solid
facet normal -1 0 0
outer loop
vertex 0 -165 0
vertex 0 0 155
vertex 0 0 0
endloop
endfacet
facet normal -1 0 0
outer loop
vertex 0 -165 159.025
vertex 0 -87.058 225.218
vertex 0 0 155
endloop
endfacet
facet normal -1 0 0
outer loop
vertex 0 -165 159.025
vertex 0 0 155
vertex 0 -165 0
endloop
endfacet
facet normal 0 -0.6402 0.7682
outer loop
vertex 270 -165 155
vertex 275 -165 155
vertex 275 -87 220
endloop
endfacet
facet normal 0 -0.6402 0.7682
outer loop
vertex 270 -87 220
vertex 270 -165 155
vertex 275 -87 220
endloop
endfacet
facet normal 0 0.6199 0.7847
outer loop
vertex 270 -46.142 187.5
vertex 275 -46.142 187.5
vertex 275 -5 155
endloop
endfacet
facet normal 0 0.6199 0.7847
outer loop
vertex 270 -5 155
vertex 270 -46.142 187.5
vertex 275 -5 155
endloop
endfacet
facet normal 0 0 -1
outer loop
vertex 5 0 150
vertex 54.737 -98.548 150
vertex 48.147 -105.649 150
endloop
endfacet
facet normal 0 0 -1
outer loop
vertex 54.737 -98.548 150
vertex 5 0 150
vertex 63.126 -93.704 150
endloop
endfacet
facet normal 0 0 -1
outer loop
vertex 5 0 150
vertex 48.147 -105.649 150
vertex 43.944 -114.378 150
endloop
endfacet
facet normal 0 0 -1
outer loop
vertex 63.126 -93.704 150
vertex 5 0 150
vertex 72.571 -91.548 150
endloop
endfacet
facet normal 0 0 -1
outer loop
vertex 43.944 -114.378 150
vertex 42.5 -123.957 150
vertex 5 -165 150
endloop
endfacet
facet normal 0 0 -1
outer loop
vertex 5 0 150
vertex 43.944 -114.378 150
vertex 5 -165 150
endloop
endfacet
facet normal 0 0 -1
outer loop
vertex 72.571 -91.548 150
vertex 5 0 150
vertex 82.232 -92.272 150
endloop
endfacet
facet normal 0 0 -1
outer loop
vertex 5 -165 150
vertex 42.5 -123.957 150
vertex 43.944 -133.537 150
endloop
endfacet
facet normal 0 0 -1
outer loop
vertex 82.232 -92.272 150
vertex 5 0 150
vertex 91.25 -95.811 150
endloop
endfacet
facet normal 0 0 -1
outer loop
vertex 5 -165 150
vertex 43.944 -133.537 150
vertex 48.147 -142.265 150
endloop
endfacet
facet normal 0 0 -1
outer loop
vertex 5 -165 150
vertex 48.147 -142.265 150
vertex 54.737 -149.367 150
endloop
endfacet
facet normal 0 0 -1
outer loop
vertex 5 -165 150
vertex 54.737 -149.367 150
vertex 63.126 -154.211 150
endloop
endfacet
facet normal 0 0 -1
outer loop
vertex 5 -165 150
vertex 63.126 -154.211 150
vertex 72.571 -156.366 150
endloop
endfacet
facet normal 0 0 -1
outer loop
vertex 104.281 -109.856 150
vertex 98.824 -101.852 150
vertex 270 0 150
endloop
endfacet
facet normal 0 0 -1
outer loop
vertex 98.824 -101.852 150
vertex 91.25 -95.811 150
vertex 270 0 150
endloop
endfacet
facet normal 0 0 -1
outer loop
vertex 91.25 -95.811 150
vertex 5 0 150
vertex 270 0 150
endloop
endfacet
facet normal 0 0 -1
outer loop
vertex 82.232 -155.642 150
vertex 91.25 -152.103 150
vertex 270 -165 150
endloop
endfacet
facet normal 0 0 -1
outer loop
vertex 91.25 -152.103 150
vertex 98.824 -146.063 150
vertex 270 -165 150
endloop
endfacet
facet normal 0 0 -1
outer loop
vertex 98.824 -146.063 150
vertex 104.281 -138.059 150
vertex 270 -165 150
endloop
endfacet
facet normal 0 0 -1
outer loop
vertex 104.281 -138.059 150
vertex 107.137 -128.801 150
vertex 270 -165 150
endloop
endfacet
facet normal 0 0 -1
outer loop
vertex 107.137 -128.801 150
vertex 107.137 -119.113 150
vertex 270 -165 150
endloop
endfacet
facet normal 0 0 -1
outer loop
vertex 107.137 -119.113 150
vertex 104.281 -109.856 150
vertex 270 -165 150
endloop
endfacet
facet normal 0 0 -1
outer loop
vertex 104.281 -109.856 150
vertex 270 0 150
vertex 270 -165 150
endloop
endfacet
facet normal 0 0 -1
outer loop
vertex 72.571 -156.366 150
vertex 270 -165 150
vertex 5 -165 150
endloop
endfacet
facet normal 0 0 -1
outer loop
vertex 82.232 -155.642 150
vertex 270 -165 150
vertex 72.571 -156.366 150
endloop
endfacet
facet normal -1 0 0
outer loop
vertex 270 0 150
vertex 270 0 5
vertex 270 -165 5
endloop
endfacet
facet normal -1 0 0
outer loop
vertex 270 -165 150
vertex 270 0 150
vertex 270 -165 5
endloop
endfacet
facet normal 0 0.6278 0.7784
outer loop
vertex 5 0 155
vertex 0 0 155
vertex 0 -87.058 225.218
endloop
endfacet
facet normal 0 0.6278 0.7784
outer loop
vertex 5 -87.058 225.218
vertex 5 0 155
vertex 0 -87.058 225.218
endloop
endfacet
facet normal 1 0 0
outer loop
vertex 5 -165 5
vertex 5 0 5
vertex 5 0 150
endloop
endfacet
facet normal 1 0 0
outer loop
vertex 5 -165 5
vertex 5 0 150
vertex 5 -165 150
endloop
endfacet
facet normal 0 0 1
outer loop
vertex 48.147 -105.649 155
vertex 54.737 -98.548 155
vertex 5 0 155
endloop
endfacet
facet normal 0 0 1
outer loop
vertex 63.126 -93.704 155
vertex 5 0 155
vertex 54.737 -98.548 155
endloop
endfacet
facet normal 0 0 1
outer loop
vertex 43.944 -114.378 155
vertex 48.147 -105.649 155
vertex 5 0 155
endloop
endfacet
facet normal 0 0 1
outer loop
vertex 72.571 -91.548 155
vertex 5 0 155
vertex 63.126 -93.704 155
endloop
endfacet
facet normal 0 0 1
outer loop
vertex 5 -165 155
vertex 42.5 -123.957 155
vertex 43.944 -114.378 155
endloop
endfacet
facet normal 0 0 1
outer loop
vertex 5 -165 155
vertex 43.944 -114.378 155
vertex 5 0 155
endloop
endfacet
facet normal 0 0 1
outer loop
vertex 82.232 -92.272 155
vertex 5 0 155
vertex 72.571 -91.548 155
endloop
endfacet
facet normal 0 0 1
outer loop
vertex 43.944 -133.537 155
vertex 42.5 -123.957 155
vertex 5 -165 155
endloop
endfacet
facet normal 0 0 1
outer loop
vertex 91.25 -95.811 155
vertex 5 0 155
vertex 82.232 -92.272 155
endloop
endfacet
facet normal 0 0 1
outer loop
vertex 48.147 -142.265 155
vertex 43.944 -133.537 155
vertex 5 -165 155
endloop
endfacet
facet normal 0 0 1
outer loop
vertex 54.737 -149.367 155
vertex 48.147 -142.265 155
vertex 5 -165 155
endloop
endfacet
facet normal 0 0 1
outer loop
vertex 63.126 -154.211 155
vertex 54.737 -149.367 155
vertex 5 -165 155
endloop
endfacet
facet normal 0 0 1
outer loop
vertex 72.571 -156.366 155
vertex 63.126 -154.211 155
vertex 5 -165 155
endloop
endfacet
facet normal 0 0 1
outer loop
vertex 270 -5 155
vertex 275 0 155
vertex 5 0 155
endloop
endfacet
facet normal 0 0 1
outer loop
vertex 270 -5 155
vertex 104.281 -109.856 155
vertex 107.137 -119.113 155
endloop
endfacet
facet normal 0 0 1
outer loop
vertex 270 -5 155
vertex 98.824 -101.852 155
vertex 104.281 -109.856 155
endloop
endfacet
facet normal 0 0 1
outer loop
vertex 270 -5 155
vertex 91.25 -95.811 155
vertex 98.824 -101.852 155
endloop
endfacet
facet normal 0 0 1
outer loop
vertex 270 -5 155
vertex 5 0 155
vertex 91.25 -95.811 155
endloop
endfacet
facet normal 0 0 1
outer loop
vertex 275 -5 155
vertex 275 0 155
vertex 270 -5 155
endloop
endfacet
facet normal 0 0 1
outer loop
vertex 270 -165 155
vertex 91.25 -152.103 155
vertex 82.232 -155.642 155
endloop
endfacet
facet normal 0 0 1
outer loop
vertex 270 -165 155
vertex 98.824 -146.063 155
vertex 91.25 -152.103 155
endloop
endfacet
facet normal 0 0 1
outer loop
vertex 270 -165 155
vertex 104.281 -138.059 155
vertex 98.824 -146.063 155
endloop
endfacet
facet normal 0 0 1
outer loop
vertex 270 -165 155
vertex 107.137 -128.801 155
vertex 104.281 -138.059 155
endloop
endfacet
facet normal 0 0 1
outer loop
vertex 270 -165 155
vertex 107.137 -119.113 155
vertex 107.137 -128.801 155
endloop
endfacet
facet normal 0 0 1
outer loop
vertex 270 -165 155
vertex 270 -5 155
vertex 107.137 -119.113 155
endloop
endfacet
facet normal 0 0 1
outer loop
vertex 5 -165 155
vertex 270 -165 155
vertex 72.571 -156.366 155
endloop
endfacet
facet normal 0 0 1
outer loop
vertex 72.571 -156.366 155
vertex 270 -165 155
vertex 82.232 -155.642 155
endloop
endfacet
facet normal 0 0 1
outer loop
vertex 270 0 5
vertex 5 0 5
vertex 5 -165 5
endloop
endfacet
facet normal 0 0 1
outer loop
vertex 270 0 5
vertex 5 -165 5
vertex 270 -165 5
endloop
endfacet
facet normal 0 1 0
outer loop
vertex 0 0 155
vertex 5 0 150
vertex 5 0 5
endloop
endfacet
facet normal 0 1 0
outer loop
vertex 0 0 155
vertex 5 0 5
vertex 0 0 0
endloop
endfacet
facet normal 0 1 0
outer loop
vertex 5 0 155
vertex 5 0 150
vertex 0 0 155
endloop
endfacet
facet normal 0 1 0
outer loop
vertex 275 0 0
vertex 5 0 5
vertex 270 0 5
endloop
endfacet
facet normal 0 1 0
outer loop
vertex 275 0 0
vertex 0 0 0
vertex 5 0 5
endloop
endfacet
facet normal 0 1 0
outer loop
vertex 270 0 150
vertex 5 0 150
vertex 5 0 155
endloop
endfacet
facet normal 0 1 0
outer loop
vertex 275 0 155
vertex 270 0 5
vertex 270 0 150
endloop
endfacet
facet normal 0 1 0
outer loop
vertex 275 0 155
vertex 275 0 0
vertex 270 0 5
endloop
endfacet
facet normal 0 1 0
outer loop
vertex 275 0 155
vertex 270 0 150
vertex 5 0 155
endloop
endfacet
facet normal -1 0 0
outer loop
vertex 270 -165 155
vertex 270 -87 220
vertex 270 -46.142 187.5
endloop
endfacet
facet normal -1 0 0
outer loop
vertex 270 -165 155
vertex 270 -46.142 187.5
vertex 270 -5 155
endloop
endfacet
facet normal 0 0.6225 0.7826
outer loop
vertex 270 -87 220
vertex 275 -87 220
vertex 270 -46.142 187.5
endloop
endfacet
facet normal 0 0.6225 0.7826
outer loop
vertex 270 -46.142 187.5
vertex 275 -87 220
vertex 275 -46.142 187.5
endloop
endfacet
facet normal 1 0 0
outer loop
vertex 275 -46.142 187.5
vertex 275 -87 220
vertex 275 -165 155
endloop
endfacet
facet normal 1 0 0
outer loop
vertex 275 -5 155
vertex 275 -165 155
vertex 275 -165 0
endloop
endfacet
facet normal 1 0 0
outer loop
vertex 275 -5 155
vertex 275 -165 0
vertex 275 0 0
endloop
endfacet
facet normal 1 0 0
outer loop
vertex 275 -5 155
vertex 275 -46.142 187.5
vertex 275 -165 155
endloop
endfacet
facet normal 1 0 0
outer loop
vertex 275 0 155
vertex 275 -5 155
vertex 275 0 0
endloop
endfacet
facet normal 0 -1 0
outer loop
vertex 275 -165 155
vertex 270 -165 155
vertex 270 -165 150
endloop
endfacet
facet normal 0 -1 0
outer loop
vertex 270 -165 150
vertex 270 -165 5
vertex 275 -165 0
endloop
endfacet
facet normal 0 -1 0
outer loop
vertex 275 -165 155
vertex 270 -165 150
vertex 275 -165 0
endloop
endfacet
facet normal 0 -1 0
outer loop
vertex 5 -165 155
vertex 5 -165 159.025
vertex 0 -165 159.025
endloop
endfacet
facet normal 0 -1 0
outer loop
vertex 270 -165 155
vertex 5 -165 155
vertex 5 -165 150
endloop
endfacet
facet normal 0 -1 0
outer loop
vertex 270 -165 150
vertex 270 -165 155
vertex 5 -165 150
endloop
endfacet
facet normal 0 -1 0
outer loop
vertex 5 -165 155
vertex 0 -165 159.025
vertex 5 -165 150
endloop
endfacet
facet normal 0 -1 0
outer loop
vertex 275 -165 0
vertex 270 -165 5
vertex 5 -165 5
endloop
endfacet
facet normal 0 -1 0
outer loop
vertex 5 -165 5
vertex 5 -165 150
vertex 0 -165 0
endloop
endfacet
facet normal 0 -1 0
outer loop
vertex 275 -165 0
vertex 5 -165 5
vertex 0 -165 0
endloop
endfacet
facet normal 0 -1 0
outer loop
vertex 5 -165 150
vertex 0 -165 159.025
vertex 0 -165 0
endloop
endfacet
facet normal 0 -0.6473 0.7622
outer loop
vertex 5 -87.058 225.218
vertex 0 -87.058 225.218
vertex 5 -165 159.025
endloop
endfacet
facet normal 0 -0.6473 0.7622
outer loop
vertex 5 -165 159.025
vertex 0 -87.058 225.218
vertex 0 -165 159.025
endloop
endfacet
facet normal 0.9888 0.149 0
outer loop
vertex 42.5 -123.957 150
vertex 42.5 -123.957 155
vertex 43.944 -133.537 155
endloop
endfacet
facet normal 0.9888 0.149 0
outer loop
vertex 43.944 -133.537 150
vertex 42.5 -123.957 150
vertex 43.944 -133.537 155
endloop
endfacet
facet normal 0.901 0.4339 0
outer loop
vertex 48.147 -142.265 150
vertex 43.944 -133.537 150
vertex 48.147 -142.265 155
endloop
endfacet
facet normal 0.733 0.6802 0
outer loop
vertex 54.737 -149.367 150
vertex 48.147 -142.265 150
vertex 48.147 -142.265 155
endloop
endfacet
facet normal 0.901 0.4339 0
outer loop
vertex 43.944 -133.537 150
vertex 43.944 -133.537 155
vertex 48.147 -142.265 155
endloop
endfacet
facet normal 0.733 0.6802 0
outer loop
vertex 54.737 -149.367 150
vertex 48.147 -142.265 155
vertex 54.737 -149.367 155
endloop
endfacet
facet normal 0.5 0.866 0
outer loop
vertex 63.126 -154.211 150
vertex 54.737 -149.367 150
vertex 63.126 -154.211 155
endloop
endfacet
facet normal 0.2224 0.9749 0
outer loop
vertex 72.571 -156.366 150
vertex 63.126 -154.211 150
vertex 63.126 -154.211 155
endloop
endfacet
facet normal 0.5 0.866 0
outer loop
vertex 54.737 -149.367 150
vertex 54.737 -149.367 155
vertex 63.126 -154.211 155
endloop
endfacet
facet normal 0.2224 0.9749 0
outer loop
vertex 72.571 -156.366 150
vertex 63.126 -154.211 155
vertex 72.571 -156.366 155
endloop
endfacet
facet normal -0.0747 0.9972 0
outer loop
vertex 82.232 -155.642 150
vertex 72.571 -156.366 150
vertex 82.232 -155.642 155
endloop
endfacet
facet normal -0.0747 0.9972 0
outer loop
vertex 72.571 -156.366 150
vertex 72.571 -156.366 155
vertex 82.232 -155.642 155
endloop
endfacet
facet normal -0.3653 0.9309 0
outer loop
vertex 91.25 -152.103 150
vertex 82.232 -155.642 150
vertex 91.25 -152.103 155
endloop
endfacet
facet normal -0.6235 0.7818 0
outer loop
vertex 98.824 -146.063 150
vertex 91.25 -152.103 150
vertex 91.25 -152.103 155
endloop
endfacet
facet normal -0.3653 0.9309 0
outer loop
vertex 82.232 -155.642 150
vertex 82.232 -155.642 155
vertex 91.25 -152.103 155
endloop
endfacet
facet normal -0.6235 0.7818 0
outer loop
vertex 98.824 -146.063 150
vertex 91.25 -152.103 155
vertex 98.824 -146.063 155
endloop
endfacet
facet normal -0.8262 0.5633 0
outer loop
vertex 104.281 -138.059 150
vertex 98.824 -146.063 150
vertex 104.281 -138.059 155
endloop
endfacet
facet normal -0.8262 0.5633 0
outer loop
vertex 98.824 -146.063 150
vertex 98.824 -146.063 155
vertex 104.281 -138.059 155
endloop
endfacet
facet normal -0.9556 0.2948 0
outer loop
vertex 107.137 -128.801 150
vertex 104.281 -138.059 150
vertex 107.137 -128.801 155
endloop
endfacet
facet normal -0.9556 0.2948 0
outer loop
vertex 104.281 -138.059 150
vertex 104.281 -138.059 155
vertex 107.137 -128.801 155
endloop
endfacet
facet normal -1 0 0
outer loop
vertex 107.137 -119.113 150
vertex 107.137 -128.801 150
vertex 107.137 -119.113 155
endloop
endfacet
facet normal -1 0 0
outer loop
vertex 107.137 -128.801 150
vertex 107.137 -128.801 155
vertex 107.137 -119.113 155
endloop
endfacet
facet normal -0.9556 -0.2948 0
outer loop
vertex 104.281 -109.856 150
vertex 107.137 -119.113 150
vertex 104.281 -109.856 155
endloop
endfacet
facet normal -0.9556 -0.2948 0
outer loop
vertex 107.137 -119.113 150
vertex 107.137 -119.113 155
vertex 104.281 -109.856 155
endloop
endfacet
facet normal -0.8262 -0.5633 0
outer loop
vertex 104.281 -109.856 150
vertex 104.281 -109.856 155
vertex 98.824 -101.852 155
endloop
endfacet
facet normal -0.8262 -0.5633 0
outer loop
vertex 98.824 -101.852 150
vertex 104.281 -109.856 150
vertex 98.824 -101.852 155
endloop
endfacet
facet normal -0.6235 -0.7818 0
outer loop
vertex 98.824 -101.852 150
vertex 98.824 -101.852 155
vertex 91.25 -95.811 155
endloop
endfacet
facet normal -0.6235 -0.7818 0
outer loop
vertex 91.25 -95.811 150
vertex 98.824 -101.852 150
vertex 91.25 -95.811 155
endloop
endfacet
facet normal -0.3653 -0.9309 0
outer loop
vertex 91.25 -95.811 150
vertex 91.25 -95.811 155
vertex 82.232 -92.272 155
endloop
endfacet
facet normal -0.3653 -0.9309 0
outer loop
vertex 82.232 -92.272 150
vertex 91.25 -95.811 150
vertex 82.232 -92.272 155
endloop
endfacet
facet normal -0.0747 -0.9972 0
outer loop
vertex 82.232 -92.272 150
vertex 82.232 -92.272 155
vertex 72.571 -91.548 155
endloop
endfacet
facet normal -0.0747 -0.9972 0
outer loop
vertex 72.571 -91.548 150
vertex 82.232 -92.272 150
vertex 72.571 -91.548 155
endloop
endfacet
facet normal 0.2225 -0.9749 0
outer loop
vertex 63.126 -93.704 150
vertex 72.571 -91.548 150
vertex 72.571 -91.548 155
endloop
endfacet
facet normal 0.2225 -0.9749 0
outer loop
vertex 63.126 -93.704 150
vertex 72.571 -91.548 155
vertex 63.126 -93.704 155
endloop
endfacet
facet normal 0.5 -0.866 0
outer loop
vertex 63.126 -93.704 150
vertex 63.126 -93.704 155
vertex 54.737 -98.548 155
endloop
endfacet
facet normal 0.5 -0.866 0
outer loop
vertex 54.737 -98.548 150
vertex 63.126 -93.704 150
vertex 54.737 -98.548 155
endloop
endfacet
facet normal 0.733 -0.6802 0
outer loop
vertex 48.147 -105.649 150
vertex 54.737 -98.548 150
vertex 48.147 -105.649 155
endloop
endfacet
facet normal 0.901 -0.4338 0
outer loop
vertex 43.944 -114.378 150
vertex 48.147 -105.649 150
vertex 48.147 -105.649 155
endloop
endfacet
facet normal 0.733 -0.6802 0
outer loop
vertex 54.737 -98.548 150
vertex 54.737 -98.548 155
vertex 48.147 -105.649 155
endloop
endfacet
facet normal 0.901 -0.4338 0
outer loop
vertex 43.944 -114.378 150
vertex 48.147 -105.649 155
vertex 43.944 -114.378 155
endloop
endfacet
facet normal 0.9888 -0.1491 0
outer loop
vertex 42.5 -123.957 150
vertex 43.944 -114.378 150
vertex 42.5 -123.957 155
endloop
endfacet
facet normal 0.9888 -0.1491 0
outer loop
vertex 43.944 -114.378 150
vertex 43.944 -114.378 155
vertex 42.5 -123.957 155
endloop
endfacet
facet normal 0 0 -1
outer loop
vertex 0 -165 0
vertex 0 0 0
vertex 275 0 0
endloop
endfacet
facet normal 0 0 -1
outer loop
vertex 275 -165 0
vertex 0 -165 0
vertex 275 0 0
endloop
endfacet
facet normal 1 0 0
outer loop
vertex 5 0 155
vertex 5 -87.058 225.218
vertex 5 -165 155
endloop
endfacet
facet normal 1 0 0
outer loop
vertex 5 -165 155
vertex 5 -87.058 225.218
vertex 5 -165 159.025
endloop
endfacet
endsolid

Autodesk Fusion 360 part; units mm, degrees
sketch "Sketch1" plane through (0, 0, 0) normal (0, 0, 1) x (1, 0, 0)
  line L0 (0, 0) -> (275, 0)
  line L1 (275, 0) -> (275, -165)
  line L2 (275, -165) -> (0, -165)
  line L3 (0, -165) -> (0, 0)
  dimension "d1" = 275
  dimension "d2" = 165
extrude "Extrude1" add sketch "Sketch1" along normal blind 5
sketch "Sketch2" plane through (0, 0, 5) normal (0, 0, 1) x (-1, 0, 0)
  line L0 (0, 165) -> (-275, 165)
  line L1 (-275, 165) -> (-275, 0)
  line L2 (-275, 0) -> (0, 0)
  line L3 (0, 0) -> (0, 165)
  line L4 (0, 0) -> (-275, 0)
  line L5 (-275, 0) -> (-275, 5)
  line L6 (-275, 5) -> (0, 5)
  line L7 (0, 5) -> (0, 0)
  line L8 (-275, 0) -> (-270, 0)
  line L9 (-270, 0) -> (-270, 165)
  line L10 (-270, 165) -> (-275, 165)
  line L11 (-275, 165) -> (-275, 0)
  line L12 (-275, 165) -> (0, 165)
  line L13 (0, 165) -> (0, 160)
  line L14 (0, 160) -> (-275, 160)
  line L15 (-275, 160) -> (-275, 165)
  line L16 (0, 0) -> (-5, 0)
  line L17 (-5, 0) -> (-5, 165)
  line L18 (-5, 165) -> (0, 165)
  line L19 (0, 165) -> (0, 0)
  dimension "d5" = 5
  dimension "d6" = 5
  dimension "d7" = 165
  dimension "d8" = 275
  dimension "d9" = 5
  dimension "d10" = 165
sketch "Sketch3" plane through (0, 0, 5) normal (0, 0, 1) x (-1, 0, 0)
extrude "Extrude2" add sketch "Sketch2" along normal blind 150 contours L0 L3 L12 L13 L14 L17 L18 L19 | L3 L6 L14 L17 L19 | L2 L3 L4 L6 L7 L16 L17 L19
sketch "Sketch4" plane through (0, 0, 5) normal (0, 0, 1) x (-1, 0, 0)
  line L0 (-5, 0) -> (-5, 165)
  line L1 (-5, 165) -> (-275, 165)
  line L2 (-275, 165) -> (-275, 0)
  line L3 (-275, 0) -> (-5, 0)
sketch "Sketch5" plane through (0, 0, 5) normal (0, 0, 1) x (-1, 0, 0)
  line L0 (-275, 0) -> (-270, 0)
  line L1 (-270, 0) -> (-270, 165)
  line L2 (-270, 165) -> (-275, 165)
  line L3 (-275, 165) -> (-275, 0)
  line L4 (-5, 0) -> (-5, 165)
  dimension "d13" = 5
  dimension "d14" = 165
  dimension "d15" = 270
extrude "Extrude3" add sketch "Sketch5" along normal blind 150
sketch "Sketch6" plane through (0, 0, 0) normal (0, 1, 0) x (1, 0, 0)
  line L0 (269.7146, -155) -> (269.7146, -150)
  line L1 (4.7146, -150) -> (4.7146, -155)
  line L2 (5, -5) -> (275, -5)
  dimension "d19" = 5
sketch "Sketch7" plane through (0, 0, 5) normal (0, 0, 1) x (-1, 0, 0)
  curve L0
  curve L1
  curve L2
  curve L3
  line L4 (-275, 165) -> (-275, 160)
  line L5 (-275, 165) -> (-275, 160)
  line L6 (-5, 160) -> (-5, 165)
  line L7 (-5, 0) -> (-275, 0)
  dimension "d21" = 265
  dimension "d22" = 5
  dimension "d25" = 270
  dimension "d26" = 145
  dimension "d27" = 265
sketch "Sketch8" plane through (0, 0, 0) normal (0, 1, 0) x (1, 0, 0)
  line L0 (5.2103, -149.946) -> (270.2103, -149.946)
  line L1 (5, -5) -> (275, -5)
sketch "Sketch9" plane through (0, 0, 5) normal (0, 0, 1) x (1, 0, 0)
sketch "Sketch10" plane through (275, 0, 0) normal (1, 0, 0) x (0, 1, 0)
  line L0 (-165, 0) -> (0, 0)
  line L1 (0, 0) -> (0, 155)
  line L2 (0, 155) -> (-165, 155)
  line L3 (-165, 155) -> (-165, 0)
  line L4 (-165, 155) -> (0, 155)
  line L5 (0, 155) -> (0, 150)
  line L6 (0, 150) -> (-165, 150)
  line L7 (-165, 150) -> (-165, 155)
  dimension "d29" = 165
  dimension "d30" = 5
extrude "Extrude4" add sketch "Sketch10" against normal blind 275 contours L1 L2 L3 L4 L5 L6 L7
sketch "Sketch11" plane through (0, 0, 0) normal (0, 1, 0) x (1, 0, 0)
sketch "Sketch12" plane through (0, 0, 0) normal (0, 1, 0) x (1, 0, 0)
sketch "Sketch13" plane through (275, 0, 0) normal (1, 0, 0) x (0, 1, 0)
  line L0 (-165, 155) -> (-165, 0)
  line L1 (-165, 0) -> (0, 0)
  line L2 (0, 0) -> (0, 155)
  line L3 (0, 155) -> (-165, 155)
  line L4 (-165, 155) -> (-135, 155) construction
sketch "Sketch14" plane through (275, 0, 0) normal (1, 0, 0) x (0, 1, 0)
  line L0 (-170, 155) -> (-5, 155)
  line L1 (-5, 155) -> (-5, 225)
  line L2 (-5, 225) -> (-170, 225)
  line L3 (-170, 225) -> (-170, 155)
  line L4 (-165, 5) -> (0, 5)
  line L5 (-170, 155) -> (-87.1175, 224.5467)
  line L6 (-170, 155) -> (-61.8046, 155) construction
  line L7 (-87.1175, 224.5467) -> (13.9338, 144.1668)
  line L8 (-87.1175, 224.5467) -> (42.0037, 224.5467) construction
  dimension "d35" = 165
  dimension "d36" = 70
  dimension "d37" = 150
  dimension "d38" = 40
  dimension "d39" = 38.5
extrude "Extrude5" add sketch "Sketch14" against normal blind 5 contours L0 L1 L5 L7
sketch "Sketch15" plane through (0, 0, 155) normal (0, 0, 1) x (-1, 0, 0)
  line L0 (-270, 5) -> (-275, 5)
  line L1 (-275, 5) -> (-275, 0)
  line L2 (-275, 0) -> (0, 0)
  line L3 (0, 0) -> (0, 165)
  line L4 (0, 165) -> (-270, 165)
  line L5 (-270, 165) -> (-270, 5)
sketch "Sketch16" plane through (0, 0, 0) normal (-1, 0, 0) x (0, -1, 0)
  line L0 (0, 155) -> (0, 0)
  line L1 (0, 0) -> (165, 0)
  line L2 (165, 0) -> (165, 155)
  line L3 (165, 155) -> (0, 155)
  line L4 (0, 155) -> (87.0576, 225.2184)
  line L5 (87.0576, 225.2184) -> (165, 159.0254)
  line L6 (165, 159.0254) -> (165, 155)
extrude "Extrude6" add sketch "Sketch16" against normal blind 5 contours L3 L4 L5 L6
sketch "Sketch17" plane through (5, 0, 0) normal (1, 0, 0) x (0, 1, 0)
  line L0 (-87.0576, 225.2184) -> (-165, 159.0254)
  line L1 (-165, 159.0254) -> (-165, 155)
  line L2 (-165, 155) -> (0, 155)
  line L3 (0, 155) -> (-87.0576, 225.2184)
sketch "Sketch18" plane through (0, 0, 0) normal (0, 1, 0) x (1, 0, 0)
  curve L0
  curve L1
  curve L2
  curve L3
  dimension "d44" = 265
  dimension "d45" = 5
sketch "Sketch19" plane through (275, 0, 0) normal (1, 0, 0) x (0, 1, 0)
  line L0 (-165, 155) -> (-165, 0)
  line L1 (-165, 0) -> (0, 0)
  line L2 (0, 0) -> (0, 155)
  line L3 (0, 155) -> (-5, 155)
  line L4 (-5, 155) -> (-5, 159.2275)
  line L5 (-5, 159.2275) -> (-87.1175, 224.5467)
  line L6 (-87.1175, 224.5467) -> (-170, 155)
  line L7 (-170, 155) -> (-165, 155)
  line L8 (-165, 155) -> (-87, 220)
  line L9 (-87, 220) -> (-46.1419, 187.5)
  line L10 (-46.1419, 187.5) -> (-5, 155)
sketch "Sketch20" plane through (0, 0, 155) normal (0, 0, 1) x (-1, 0, 0)
  circle A0 centre (-75, 123.9573) radius 32.5
  line L0 (-270, 165) -> (-270, 5)
  line L1 (-270.2103, 3.9573) -> (-5.2104, 3.9572)
  dimension "d46" = 65
  dimension "d47" = 195
  dimension "d48" = 120
extrude "Extrude7" cut sketch "Sketch20" against normal blind 5
sketch "Sketch21" plane through (275, 0, 0) normal (1, 0, 0) x (0, 1, 0)
sketch "Sketch22" plane through (5, 0, 0) normal (1, 0, 0) x (0, 1, 0)
extrude "Extrude8" cut sketch "Sketch19" against normal blind 150 contours L4 L5 L6 L7 L8 L9 L10
sketch "Sketch23" plane through (0, 0, 0) normal (0, 1, 0) x (1, 0, 0)
equation "d1 = 165 mm + 65 mm + 35 mm + 10 mm"
equation "d2 = 55 mm + 48 mm + 10 mm + 52 mm"
